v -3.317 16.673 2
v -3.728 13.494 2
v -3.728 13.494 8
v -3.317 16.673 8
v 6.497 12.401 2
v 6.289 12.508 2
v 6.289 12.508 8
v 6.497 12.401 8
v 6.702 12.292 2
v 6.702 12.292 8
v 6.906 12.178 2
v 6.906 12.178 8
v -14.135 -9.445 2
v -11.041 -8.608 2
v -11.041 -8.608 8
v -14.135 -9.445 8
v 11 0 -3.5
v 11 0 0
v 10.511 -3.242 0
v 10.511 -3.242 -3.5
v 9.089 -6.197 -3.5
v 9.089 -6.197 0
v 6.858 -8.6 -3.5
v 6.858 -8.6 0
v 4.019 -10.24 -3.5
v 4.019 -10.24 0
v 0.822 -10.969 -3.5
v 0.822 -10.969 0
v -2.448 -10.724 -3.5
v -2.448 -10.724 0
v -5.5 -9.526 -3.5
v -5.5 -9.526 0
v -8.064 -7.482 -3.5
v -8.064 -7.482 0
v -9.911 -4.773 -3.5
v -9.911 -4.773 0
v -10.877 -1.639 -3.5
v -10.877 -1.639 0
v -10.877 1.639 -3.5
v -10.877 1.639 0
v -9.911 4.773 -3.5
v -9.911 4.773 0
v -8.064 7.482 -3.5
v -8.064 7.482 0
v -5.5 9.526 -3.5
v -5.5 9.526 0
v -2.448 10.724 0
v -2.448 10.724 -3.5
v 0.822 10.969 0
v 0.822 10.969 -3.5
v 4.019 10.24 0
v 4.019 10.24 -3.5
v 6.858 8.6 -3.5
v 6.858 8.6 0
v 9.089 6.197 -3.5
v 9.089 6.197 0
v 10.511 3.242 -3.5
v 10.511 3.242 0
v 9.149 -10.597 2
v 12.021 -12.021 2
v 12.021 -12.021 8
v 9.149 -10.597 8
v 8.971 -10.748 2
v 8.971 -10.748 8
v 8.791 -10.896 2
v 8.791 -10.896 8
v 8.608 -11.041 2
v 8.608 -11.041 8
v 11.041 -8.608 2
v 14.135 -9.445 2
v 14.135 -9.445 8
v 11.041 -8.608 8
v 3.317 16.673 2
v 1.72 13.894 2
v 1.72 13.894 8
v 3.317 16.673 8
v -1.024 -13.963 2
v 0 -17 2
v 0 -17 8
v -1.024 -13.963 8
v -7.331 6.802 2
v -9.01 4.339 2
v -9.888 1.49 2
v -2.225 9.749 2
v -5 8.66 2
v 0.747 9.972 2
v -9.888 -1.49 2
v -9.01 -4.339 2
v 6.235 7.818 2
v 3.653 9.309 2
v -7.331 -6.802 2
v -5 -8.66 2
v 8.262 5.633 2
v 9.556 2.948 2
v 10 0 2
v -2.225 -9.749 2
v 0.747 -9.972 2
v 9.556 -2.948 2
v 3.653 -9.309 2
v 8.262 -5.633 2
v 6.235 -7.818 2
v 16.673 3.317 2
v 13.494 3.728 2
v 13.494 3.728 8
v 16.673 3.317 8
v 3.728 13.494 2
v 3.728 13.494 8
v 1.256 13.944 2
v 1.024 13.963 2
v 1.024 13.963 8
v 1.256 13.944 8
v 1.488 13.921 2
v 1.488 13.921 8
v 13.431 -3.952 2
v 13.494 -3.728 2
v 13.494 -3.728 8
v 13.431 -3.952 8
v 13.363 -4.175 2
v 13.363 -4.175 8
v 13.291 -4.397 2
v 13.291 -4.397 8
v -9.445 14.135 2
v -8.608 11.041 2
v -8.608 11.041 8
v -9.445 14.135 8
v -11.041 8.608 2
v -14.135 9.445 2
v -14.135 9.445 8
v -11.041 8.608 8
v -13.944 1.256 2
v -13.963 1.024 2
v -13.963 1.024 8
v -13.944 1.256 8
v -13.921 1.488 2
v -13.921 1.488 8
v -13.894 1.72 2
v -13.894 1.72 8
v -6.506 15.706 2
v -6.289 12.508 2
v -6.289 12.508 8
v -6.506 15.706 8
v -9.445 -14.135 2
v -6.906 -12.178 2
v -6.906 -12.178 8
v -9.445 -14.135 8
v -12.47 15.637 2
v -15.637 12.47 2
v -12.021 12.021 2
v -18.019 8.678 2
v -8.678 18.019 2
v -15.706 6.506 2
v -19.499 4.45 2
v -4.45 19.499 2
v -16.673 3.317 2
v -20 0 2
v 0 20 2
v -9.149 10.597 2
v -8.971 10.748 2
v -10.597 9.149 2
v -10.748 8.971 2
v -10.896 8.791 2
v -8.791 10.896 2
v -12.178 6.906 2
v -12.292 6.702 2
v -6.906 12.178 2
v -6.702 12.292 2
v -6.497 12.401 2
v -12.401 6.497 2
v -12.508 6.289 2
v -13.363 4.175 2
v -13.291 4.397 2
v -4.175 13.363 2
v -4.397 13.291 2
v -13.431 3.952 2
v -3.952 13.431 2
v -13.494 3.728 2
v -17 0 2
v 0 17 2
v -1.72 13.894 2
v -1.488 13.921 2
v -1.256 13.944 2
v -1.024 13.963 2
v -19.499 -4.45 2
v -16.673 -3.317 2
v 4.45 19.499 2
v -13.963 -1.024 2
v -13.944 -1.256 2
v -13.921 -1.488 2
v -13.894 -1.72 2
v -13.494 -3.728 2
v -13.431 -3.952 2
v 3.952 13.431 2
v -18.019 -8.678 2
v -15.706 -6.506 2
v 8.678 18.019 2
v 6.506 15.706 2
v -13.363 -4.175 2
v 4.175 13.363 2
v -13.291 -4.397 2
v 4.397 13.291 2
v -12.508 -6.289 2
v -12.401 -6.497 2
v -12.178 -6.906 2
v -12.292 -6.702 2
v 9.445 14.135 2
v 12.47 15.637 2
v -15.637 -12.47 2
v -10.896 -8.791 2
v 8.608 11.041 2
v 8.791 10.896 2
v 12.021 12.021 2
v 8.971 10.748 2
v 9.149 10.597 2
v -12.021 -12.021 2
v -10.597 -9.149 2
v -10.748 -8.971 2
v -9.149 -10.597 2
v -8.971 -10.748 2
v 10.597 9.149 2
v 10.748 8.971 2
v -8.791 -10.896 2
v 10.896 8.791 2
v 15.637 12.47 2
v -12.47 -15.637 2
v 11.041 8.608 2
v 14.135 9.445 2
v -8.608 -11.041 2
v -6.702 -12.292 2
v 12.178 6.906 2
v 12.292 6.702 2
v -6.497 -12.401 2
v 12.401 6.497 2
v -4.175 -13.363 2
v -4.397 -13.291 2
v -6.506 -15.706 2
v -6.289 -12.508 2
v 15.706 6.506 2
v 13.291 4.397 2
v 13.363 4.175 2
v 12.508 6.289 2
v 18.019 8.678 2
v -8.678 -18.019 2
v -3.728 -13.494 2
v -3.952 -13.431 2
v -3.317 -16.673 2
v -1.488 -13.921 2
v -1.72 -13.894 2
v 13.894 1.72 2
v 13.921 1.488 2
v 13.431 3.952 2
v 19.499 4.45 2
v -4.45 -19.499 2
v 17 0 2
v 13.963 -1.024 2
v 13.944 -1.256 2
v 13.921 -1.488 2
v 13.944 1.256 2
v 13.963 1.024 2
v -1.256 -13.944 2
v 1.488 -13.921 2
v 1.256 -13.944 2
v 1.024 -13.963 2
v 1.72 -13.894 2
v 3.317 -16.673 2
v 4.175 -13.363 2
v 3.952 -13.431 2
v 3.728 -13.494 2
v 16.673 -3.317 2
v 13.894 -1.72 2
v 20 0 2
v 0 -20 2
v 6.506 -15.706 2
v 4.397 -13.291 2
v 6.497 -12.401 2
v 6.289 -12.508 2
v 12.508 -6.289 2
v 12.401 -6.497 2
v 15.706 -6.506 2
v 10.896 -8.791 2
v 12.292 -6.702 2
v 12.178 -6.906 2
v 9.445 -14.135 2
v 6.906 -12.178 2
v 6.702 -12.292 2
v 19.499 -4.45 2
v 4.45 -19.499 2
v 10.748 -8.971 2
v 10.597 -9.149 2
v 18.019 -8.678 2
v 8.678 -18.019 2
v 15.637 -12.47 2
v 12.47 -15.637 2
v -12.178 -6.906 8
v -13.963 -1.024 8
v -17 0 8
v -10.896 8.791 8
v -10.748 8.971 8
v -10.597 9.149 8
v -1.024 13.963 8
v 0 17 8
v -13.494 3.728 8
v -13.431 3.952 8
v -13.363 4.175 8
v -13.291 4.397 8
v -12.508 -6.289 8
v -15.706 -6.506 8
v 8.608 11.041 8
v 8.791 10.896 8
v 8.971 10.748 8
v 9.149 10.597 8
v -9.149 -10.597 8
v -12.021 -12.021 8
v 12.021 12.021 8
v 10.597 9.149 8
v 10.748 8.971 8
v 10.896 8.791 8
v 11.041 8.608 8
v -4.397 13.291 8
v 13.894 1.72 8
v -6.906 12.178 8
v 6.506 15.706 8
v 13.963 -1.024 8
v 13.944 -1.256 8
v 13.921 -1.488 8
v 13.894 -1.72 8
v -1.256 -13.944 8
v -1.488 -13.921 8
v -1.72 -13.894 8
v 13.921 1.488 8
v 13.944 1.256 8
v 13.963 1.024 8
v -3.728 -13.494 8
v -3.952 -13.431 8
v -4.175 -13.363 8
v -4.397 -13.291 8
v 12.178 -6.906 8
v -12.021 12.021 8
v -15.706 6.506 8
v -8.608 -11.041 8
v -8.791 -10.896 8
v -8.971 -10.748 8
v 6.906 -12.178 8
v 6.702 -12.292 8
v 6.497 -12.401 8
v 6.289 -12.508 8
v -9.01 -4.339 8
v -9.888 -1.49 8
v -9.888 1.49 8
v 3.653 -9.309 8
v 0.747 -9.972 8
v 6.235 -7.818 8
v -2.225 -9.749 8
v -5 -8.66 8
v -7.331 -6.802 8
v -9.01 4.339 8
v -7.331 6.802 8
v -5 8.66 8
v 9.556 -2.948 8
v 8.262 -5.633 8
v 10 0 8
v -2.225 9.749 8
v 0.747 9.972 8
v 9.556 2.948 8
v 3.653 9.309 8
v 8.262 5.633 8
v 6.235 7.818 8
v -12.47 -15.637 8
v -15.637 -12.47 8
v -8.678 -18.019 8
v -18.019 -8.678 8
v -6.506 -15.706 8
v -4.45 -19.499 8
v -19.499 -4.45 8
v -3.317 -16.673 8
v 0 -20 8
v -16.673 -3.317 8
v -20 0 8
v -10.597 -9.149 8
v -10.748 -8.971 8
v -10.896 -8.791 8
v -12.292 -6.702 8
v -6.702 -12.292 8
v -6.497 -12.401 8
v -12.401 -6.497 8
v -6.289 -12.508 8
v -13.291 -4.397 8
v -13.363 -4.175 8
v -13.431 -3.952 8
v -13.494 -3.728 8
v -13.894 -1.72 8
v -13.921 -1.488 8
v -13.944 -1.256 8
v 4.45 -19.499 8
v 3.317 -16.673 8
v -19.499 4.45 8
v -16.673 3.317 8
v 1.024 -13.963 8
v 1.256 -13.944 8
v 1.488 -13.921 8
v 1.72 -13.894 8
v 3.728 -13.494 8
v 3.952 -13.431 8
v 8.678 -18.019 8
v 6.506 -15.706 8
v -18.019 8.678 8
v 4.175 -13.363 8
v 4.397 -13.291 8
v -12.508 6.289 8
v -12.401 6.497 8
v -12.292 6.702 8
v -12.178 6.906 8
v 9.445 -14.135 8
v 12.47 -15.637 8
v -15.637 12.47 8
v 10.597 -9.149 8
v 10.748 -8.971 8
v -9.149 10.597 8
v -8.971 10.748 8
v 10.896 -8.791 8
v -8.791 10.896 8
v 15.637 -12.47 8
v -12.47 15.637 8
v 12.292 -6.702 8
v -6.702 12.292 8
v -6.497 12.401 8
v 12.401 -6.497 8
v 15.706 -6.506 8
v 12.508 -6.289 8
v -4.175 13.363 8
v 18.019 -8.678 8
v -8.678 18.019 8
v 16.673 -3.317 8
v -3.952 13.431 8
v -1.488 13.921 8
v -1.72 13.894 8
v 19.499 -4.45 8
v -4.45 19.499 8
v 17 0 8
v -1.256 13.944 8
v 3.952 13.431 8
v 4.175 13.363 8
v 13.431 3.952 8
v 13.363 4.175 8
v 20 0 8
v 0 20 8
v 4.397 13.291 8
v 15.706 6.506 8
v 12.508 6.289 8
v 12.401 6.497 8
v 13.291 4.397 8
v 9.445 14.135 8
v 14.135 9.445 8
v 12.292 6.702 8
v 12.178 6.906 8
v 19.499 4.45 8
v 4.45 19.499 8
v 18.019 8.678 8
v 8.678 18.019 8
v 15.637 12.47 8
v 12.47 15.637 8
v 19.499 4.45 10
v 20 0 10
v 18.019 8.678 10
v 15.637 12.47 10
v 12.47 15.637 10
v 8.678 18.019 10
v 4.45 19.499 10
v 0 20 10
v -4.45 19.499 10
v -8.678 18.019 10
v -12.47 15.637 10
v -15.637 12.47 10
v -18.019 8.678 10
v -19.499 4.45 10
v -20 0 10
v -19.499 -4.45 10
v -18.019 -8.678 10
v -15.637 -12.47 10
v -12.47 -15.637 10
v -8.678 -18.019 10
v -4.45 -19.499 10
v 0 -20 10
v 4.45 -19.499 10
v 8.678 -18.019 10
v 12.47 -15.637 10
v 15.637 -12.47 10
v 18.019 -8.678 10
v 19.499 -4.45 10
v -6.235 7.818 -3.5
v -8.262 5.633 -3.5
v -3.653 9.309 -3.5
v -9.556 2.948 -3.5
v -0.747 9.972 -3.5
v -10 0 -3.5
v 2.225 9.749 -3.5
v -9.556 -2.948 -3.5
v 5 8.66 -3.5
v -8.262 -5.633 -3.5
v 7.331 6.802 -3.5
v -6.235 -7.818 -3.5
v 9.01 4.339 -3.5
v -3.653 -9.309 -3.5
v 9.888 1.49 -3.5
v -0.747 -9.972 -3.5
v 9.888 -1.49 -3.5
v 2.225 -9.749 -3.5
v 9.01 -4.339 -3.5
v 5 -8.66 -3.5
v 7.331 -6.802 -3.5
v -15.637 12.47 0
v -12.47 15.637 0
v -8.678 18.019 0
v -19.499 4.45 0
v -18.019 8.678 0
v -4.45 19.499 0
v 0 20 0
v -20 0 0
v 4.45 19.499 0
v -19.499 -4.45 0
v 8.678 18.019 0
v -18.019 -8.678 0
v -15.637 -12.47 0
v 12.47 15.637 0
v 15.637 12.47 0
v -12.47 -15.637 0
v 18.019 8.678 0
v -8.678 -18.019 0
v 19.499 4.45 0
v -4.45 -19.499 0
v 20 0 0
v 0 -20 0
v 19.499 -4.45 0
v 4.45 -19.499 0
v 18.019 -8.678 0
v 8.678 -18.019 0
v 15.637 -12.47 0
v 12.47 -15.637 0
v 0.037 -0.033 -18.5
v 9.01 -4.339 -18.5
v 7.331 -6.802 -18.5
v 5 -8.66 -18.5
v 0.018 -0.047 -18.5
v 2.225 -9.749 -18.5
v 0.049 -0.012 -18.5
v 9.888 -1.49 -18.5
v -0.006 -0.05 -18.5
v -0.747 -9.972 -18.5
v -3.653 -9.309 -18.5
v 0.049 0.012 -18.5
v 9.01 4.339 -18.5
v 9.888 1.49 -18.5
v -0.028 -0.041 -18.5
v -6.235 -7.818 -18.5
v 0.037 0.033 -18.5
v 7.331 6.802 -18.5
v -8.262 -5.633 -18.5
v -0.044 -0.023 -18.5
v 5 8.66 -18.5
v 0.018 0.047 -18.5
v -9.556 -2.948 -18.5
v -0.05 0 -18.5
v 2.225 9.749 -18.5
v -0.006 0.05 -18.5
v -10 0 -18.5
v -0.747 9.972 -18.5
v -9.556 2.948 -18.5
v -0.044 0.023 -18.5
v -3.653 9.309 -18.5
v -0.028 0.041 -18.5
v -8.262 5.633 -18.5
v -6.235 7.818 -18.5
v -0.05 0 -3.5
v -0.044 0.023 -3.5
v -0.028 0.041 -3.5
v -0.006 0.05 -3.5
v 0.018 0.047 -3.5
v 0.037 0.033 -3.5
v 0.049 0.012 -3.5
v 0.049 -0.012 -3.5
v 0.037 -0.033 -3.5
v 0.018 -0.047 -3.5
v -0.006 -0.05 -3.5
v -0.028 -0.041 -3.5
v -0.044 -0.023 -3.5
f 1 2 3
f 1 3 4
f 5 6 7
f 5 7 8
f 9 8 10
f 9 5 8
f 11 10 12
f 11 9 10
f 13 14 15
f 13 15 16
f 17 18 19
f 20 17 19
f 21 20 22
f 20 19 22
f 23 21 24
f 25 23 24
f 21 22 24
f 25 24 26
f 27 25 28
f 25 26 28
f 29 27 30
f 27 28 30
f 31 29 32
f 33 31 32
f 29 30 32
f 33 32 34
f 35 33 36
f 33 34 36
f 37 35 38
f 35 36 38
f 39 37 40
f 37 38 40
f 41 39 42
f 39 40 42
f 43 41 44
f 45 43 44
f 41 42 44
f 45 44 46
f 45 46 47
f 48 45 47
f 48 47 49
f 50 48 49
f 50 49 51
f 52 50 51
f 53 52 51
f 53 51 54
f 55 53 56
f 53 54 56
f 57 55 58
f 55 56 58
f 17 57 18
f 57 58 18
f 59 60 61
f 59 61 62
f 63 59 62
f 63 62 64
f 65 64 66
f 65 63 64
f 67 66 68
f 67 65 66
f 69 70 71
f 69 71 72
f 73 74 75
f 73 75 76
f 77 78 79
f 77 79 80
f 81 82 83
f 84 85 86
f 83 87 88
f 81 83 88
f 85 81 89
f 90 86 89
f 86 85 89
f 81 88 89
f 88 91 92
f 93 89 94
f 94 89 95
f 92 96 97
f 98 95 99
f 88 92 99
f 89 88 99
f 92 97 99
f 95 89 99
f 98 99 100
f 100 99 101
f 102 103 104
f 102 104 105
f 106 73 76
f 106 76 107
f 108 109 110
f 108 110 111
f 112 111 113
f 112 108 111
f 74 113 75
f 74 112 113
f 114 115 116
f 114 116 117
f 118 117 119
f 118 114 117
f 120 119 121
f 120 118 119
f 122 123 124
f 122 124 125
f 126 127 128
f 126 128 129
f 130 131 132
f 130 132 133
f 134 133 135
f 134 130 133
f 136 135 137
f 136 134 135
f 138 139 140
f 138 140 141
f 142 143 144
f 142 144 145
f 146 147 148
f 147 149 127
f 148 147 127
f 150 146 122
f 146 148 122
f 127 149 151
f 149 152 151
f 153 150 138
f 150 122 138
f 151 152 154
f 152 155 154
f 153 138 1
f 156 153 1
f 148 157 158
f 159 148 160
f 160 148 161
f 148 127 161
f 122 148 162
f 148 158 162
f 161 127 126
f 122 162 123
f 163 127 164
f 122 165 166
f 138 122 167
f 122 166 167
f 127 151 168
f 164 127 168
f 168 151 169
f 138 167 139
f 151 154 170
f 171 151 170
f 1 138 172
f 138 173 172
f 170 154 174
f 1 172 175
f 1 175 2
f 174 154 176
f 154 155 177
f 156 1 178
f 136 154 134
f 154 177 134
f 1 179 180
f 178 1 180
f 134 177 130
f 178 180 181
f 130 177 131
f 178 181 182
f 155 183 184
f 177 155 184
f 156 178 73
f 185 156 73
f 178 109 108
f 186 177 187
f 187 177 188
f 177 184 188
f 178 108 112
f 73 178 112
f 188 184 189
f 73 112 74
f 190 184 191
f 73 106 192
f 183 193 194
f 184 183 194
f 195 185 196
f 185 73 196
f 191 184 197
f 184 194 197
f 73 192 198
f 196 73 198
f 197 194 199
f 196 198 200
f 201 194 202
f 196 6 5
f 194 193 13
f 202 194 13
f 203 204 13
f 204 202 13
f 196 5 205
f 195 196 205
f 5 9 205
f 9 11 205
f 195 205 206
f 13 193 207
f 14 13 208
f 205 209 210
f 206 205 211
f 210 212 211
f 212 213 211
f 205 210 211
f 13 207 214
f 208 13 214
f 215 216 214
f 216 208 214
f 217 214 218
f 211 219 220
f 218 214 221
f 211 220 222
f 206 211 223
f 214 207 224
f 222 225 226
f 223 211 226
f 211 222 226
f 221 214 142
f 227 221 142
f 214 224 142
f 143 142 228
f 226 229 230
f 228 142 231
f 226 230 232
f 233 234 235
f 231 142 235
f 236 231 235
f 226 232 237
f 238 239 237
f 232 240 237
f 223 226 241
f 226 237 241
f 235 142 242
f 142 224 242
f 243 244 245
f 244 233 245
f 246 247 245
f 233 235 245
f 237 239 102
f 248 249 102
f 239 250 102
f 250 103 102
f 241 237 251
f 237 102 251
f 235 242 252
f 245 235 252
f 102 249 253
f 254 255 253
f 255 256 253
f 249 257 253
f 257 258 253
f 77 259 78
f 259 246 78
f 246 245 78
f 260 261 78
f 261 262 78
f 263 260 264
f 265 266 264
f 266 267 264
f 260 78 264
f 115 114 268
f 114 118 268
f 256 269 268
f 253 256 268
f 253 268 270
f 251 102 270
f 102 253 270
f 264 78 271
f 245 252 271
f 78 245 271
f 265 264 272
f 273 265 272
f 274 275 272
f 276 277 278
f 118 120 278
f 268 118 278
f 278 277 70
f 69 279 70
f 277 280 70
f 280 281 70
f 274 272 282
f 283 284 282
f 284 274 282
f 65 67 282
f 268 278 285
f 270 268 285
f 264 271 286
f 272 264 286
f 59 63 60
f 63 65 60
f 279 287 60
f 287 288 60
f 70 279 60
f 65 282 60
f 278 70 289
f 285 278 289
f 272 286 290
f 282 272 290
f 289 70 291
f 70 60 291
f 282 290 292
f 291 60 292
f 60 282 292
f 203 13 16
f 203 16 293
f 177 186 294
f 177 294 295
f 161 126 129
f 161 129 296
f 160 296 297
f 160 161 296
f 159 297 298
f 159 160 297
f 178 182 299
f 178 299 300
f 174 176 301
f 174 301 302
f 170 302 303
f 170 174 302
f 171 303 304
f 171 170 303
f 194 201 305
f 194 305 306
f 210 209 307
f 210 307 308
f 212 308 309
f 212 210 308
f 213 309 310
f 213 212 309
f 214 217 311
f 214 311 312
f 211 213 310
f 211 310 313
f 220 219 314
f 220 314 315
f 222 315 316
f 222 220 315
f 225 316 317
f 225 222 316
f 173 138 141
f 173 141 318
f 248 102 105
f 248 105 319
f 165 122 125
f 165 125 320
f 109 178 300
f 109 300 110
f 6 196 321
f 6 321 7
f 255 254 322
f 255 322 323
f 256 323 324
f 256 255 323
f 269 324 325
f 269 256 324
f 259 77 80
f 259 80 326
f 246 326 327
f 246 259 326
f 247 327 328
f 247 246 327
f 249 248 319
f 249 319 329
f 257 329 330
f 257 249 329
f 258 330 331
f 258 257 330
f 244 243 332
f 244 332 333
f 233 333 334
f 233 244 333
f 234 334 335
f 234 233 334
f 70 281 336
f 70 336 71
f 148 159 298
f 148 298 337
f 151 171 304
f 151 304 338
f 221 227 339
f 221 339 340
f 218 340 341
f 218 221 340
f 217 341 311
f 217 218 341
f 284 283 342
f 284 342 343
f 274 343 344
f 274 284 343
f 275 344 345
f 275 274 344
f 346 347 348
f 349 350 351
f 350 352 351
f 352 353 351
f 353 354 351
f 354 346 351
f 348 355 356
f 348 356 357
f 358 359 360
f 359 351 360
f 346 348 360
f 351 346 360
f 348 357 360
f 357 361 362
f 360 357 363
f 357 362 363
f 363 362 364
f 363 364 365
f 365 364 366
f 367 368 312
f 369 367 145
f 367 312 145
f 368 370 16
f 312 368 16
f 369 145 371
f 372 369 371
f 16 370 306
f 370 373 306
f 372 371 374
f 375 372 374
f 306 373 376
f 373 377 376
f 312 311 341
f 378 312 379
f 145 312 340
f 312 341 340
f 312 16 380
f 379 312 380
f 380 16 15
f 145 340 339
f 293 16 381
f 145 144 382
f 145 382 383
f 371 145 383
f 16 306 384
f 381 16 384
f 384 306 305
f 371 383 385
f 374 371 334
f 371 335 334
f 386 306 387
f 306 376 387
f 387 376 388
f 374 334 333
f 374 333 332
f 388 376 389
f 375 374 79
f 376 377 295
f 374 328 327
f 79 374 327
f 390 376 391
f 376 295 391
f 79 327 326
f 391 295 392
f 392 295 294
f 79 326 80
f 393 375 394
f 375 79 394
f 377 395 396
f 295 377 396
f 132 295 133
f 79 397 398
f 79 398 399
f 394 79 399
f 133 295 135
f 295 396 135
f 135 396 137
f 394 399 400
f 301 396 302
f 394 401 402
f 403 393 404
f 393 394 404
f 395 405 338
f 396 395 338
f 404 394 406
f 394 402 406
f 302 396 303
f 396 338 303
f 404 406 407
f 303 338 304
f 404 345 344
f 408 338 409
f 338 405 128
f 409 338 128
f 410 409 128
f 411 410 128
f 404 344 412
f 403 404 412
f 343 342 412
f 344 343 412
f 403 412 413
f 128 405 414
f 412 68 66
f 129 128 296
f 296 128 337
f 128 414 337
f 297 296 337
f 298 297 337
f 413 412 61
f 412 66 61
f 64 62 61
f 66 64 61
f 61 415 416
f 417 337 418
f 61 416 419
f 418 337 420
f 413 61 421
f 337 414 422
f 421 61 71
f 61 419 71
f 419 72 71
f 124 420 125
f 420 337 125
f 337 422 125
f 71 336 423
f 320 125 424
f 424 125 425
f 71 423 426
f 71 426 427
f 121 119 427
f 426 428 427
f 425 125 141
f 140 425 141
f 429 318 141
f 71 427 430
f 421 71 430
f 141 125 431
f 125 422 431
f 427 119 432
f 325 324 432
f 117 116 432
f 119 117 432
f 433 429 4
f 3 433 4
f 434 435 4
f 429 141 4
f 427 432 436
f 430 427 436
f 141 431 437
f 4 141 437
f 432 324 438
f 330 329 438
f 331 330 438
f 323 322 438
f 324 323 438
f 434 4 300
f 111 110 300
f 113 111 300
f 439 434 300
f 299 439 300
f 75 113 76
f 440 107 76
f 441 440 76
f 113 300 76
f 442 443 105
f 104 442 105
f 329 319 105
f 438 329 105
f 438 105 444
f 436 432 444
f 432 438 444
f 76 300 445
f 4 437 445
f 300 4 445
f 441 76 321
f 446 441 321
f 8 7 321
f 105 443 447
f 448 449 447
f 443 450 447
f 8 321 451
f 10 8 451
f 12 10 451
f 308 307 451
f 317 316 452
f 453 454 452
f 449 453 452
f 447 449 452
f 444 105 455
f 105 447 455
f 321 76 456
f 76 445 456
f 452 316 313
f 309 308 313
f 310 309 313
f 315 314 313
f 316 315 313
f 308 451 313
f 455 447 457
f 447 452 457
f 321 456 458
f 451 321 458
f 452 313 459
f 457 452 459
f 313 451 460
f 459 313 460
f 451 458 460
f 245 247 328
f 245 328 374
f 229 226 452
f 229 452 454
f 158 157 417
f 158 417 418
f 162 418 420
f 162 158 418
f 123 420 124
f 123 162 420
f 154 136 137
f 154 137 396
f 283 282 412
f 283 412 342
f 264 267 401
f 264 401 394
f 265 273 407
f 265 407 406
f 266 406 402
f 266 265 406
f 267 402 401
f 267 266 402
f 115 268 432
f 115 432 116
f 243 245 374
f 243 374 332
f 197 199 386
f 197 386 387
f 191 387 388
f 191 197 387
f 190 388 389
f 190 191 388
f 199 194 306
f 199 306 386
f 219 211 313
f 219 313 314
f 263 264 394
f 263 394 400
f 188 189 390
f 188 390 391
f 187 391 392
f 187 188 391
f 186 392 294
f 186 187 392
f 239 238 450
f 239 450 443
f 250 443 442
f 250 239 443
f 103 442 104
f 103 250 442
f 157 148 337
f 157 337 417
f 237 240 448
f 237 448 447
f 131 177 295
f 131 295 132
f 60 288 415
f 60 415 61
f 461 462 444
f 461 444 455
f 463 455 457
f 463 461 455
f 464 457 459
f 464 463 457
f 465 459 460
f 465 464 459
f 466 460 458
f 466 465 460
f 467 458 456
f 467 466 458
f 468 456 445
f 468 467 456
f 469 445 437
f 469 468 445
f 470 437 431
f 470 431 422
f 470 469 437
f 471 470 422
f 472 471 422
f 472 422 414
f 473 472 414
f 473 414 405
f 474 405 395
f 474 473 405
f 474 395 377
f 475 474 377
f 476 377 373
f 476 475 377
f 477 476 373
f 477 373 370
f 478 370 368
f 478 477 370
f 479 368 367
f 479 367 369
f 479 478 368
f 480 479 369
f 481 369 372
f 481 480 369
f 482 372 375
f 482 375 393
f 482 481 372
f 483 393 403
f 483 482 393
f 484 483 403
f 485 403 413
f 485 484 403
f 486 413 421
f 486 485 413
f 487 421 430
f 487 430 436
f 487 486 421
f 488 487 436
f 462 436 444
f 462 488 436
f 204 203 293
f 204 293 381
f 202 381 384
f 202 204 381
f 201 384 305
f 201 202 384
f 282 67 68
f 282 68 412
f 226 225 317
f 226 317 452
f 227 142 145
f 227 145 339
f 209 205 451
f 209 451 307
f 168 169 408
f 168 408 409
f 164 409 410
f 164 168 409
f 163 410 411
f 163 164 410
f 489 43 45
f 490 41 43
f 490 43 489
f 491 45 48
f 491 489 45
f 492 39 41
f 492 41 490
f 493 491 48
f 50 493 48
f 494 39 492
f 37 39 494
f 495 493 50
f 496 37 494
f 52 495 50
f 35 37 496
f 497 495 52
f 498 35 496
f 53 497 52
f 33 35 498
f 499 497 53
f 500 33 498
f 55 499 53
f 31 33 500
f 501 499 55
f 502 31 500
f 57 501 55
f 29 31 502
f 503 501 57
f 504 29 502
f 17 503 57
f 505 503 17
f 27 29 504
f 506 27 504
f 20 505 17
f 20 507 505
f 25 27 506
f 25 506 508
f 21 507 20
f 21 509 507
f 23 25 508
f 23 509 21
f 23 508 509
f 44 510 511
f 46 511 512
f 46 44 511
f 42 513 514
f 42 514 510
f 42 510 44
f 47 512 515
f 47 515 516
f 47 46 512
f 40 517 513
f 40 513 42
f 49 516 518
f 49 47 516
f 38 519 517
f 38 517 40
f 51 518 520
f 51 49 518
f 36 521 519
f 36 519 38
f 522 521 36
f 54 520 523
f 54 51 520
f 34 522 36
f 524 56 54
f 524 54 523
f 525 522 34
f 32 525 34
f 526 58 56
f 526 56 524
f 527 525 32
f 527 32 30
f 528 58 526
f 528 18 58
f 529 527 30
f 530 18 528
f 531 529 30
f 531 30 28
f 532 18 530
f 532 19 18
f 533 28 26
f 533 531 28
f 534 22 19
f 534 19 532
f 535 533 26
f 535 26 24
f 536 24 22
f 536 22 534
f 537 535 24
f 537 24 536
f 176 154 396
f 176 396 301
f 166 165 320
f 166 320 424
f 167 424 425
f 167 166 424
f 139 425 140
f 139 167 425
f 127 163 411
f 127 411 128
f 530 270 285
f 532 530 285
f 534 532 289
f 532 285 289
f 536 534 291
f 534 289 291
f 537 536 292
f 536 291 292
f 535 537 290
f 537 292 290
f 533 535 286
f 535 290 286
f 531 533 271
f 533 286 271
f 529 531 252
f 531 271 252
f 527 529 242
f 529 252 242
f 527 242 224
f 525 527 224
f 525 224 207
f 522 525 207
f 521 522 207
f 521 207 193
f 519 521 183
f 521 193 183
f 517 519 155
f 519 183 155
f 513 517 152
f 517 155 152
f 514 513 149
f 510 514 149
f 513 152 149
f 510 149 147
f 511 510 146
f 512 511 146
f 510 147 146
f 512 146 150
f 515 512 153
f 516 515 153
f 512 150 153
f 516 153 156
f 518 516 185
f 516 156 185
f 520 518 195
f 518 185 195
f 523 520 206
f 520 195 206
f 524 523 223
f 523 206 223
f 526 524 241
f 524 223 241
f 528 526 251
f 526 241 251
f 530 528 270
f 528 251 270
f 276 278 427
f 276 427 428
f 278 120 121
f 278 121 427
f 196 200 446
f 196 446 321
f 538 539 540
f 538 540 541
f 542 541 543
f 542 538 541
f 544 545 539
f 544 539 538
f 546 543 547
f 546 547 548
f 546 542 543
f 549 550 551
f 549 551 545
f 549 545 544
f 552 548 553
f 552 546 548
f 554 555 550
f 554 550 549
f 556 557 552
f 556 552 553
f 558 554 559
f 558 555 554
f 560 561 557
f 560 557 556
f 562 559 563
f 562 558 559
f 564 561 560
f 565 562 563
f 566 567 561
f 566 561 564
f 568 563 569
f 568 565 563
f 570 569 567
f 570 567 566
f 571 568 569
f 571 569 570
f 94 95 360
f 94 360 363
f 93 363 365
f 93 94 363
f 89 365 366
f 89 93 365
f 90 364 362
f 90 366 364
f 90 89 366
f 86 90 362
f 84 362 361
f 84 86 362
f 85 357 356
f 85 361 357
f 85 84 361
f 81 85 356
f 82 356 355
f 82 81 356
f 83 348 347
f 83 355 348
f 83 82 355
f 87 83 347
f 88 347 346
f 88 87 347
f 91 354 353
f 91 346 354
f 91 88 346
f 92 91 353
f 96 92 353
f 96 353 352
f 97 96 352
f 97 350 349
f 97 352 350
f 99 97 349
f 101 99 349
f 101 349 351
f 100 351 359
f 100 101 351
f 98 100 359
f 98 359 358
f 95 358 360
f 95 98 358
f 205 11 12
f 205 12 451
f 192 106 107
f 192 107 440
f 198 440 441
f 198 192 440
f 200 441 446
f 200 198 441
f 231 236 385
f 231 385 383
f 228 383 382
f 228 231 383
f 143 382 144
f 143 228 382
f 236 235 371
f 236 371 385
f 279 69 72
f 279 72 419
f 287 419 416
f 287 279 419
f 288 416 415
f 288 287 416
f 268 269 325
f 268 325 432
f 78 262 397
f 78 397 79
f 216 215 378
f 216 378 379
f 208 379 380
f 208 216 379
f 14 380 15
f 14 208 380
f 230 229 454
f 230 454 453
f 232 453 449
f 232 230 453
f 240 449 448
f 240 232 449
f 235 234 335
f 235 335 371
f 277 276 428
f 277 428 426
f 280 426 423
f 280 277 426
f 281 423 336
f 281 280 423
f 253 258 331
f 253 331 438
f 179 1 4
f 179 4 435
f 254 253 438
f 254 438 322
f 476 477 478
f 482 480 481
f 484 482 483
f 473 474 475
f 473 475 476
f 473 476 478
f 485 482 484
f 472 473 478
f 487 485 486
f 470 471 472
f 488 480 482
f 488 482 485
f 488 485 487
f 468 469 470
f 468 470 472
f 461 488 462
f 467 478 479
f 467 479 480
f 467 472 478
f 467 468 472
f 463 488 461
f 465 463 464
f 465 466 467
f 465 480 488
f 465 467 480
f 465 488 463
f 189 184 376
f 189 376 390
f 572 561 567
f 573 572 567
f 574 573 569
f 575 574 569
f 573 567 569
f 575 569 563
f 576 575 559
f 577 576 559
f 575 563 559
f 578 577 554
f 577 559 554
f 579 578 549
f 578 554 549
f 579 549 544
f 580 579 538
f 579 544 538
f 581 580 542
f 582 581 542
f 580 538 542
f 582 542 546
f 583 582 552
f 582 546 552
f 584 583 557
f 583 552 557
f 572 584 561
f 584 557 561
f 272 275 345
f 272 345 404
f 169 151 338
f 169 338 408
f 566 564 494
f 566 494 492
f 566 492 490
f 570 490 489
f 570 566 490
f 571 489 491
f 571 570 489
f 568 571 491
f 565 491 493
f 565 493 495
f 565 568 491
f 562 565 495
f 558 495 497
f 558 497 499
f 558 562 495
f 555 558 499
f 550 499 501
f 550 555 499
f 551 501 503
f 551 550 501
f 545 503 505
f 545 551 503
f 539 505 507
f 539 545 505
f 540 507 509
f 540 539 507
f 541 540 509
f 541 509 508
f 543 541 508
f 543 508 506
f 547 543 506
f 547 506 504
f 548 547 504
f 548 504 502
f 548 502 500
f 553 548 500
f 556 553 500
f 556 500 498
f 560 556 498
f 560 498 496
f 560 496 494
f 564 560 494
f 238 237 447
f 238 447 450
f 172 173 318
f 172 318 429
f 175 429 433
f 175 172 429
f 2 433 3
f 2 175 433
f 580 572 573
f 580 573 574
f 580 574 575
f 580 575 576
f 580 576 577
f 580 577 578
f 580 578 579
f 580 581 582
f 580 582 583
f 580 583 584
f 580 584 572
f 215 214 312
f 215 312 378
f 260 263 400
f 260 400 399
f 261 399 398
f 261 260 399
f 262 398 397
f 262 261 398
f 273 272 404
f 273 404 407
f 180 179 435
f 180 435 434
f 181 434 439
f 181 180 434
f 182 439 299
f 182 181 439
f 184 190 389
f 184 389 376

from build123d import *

# Parameters (mm, degrees)
SKETCH1_R           = 10
BOSS_EXTRUDE1_DEPTH = 10
SKETCH2_R           = 20
BOSS_EXTRUDE2_DEPTH = 2
BOSS_EXTRUDE3_START = -2
SKETCH3_R           = 20
BOSS_EXTRUDE3_DEPTH = 2
BOSS_EXTRUDE4_START = 18.5
SKETCH4_R           = 10
SKETCH4_R_2         = 0.05
BOSS_EXTRUDE4_DEPTH = 18.5
SKETCH5_R           = 11
BOSS_EXTRUDE5_DEPTH = 3.5


with BuildPart() as part:
    # Sketch1 → Boss-Extrude1 (new body)
    with BuildSketch(Plane.XY):
        with BuildLine():
            Line((0, 17), (1.023829773, 13.962513119))
            ThreePointArc((1.023829773, 13.962513119), (1.372239965, 13.932586173), (1.719794009, 13.893966625))
            Line((1.719794009, 13.893966625), (3.316535474, 16.673349767))
            Line((3.316535474, 16.673349767), (3.728108352, 13.494488064))
            ThreePointArc((3.728108352, 13.494488064), (4.063985482, 13.3971647), (4.397327072, 13.291482785))
            Line((4.397327072, 13.291482785), (6.50561835, 15.705952053))
            Line((6.50561835, 15.705952053), (6.289117817, 12.507877401))
            ThreePointArc((6.289117817, 12.507877401), (6.599554316, 12.346897701), (6.905873322, 12.178214715))
            Line((6.905873322, 12.178214715), (9.444693961, 14.134983409))
            Line((9.444693961, 14.134983409), (8.608440012, 11.040596024))
            ThreePointArc((8.608440012, 11.040596024), (8.881505978, 10.822146347), (9.149030733, 10.596944684))
            Line((9.149030733, 10.596944684), (12.02081528, 12.02081528))
            Line((12.02081528, 12.02081528), (10.596944684, 9.149030733))
            ThreePointArc((10.596944684, 9.149030733), (10.822146347, 8.881505978), (11.040596024, 8.608440012))
            Line((11.040596024, 8.608440012), (14.134983409, 9.444693961))
            Line((14.134983409, 9.444693961), (12.178214715, 6.905873322))
            ThreePointArc((12.178214715, 6.905873322), (12.346897701, 6.599554316), (12.507877401, 6.289117817))
            Line((12.507877401, 6.289117817), (15.705952053, 6.50561835))
            Line((15.705952053, 6.50561835), (13.291482785, 4.397327072))
            ThreePointArc((13.291482785, 4.397327072), (13.3971647, 4.063985482), (13.494488064, 3.728108352))
            Line((13.494488064, 3.728108352), (16.673349767, 3.316535474))
            Line((16.673349767, 3.316535474), (13.893966625, 1.719794009))
            ThreePointArc((13.893966625, 1.719794009), (13.932586173, 1.372239965), (13.962513119, 1.023829773))
            Line((13.962513119, 1.023829773), (17, 0))
            Line((17, 0), (13.962513119, -1.023829773))
            ThreePointArc((13.962513119, -1.023829773), (13.932586173, -1.372239965), (13.893966625, -1.719794009))
            Line((13.893966625, -1.719794009), (16.673349767, -3.316535474))
            Line((16.673349767, -3.316535474), (13.494488064, -3.728108352))
            ThreePointArc((13.494488064, -3.728108352), (13.3971647, -4.063985482), (13.291482785, -4.397327072))
            Line((13.291482785, -4.397327072), (15.705952053, -6.50561835))
            Line((15.705952053, -6.50561835), (12.507877401, -6.289117817))
            ThreePointArc((12.507877401, -6.289117817), (12.346897701, -6.599554316), (12.178214715, -6.905873322))
            Line((12.178214715, -6.905873322), (14.134983409, -9.444693961))
            Line((14.134983409, -9.444693961), (11.040596024, -8.608440012))
            ThreePointArc((11.040596024, -8.608440012), (10.822146347, -8.881505978), (10.596944684, -9.149030733))
            Line((10.596944684, -9.149030733), (12.02081528, -12.02081528))
            Line((12.02081528, -12.02081528), (9.149030733, -10.596944684))
            ThreePointArc((9.149030733, -10.596944684), (8.881505978, -10.822146347), (8.608440012, -11.040596024))
            Line((8.608440012, -11.040596024), (9.444693961, -14.134983409))
            Line((9.444693961, -14.134983409), (6.905873322, -12.178214715))
            ThreePointArc((6.905873322, -12.178214715), (6.599554316, -12.346897701), (6.289117817, -12.507877401))
            Line((6.289117817, -12.507877401), (6.50561835, -15.705952053))
            Line((6.50561835, -15.705952053), (4.397327072, -13.291482785))
            ThreePointArc((4.397327072, -13.291482785), (4.063985482, -13.3971647), (3.728108352, -13.494488064))
            Line((3.728108352, -13.494488064), (3.316535474, -16.673349767))
            Line((3.316535474, -16.673349767), (1.719794009, -13.893966625))
            ThreePointArc((1.719794009, -13.893966625), (1.372239965, -13.932586173), (1.023829773, -13.962513119))
            Line((1.023829773, -13.962513119), (0, -17))
            Line((0, -17), (-1.023829773, -13.962513119))
            ThreePointArc((-1.023829773, -13.962513119), (-1.372239965, -13.932586173), (-1.719794009, -13.893966625))
            Line((-1.719794009, -13.893966625), (-3.316535474, -16.673349767))
            Line((-3.316535474, -16.673349767), (-3.728108352, -13.494488064))
            ThreePointArc((-3.728108352, -13.494488064), (-4.063985482, -13.3971647), (-4.397327072, -13.291482785))
            Line((-4.397327072, -13.291482785), (-6.50561835, -15.705952053))
            Line((-6.50561835, -15.705952053), (-6.289117817, -12.507877401))
            ThreePointArc((-6.289117817, -12.507877401), (-6.599554316, -12.346897701), (-6.905873322, -12.178214715))
            Line((-6.905873322, -12.178214715), (-9.444693961, -14.134983409))
            Line((-9.444693961, -14.134983409), (-8.608440012, -11.040596024))
            ThreePointArc((-8.608440012, -11.040596024), (-8.881505978, -10.822146347), (-9.149030733, -10.596944684))
            Line((-9.149030733, -10.596944684), (-12.02081528, -12.02081528))
            Line((-12.02081528, -12.02081528), (-10.596944684, -9.149030733))
            ThreePointArc((-10.596944684, -9.149030733), (-10.822146347, -8.881505978), (-11.040596024, -8.608440012))
            Line((-11.040596024, -8.608440012), (-14.134983409, -9.444693961))
            Line((-14.134983409, -9.444693961), (-12.178214715, -6.905873322))
            ThreePointArc((-12.178214715, -6.905873322), (-12.346897701, -6.599554316), (-12.507877401, -6.289117817))
            Line((-12.507877401, -6.289117817), (-15.705952053, -6.50561835))
            Line((-15.705952053, -6.50561835), (-13.291482785, -4.397327072))
            ThreePointArc((-13.291482785, -4.397327072), (-13.3971647, -4.063985482), (-13.494488064, -3.728108352))
            Line((-13.494488064, -3.728108352), (-16.673349767, -3.316535474))
            Line((-16.673349767, -3.316535474), (-13.893966625, -1.719794009))
            ThreePointArc((-13.893966625, -1.719794009), (-13.932586173, -1.372239965), (-13.962513119, -1.023829773))
            Line((-13.962513119, -1.023829773), (-17, 0))
            Line((-17, 0), (-13.962513119, 1.023829773))
            ThreePointArc((-13.962513119, 1.023829773), (-13.932586173, 1.372239965), (-13.893966625, 1.719794009))
            Line((-13.893966625, 1.719794009), (-16.673349767, 3.316535474))
            Line((-16.673349767, 3.316535474), (-13.494488064, 3.728108352))
            ThreePointArc((-13.494488064, 3.728108352), (-13.3971647, 4.063985482), (-13.291482785, 4.397327072))
            Line((-13.291482785, 4.397327072), (-15.705952053, 6.50561835))
            Line((-15.705952053, 6.50561835), (-12.507877401, 6.289117817))
            ThreePointArc((-12.507877401, 6.289117817), (-12.346897701, 6.599554316), (-12.178214715, 6.905873322))
            Line((-12.178214715, 6.905873322), (-14.134983409, 9.444693961))
            Line((-14.134983409, 9.444693961), (-11.040596024, 8.608440012))
            ThreePointArc((-11.040596024, 8.608440012), (-10.822146347, 8.881505978), (-10.596944684, 9.149030733))
            Line((-10.596944684, 9.149030733), (-12.02081528, 12.02081528))
            Line((-12.02081528, 12.02081528), (-9.149030733, 10.596944684))
            ThreePointArc((-9.149030733, 10.596944684), (-8.881505978, 10.822146347), (-8.608440012, 11.040596024))
            Line((-8.608440012, 11.040596024), (-9.444693961, 14.134983409))
            Line((-9.444693961, 14.134983409), (-6.905873322, 12.178214715))
            ThreePointArc((-6.905873322, 12.178214715), (-6.599554316, 12.346897701), (-6.289117817, 12.507877401))
            Line((-6.289117817, 12.507877401), (-6.50561835, 15.705952053))
            Line((-6.50561835, 15.705952053), (-4.397327072, 13.291482785))
            ThreePointArc((-4.397327072, 13.291482785), (-4.063985482, 13.3971647), (-3.728108352, 13.494488064))
            Line((-3.728108352, 13.494488064), (-3.316535474, 16.673349767))
            Line((-3.316535474, 16.673349767), (-1.719794009, 13.893966625))
            ThreePointArc((-1.719794009, 13.893966625), (-1.372239965, 13.932586173), (-1.023829773, 13.962513119))
            Line((-1.023829773, 13.962513119), (0, 17))
        make_face()
        Circle(SKETCH1_R, mode=Mode.SUBTRACT)
    extrude(amount=BOSS_EXTRUDE1_DEPTH)

    # Sketch2 → Boss-Extrude2 (add)
    with BuildSketch(Plane.XY.offset(10)):
        Circle(SKETCH2_R)
    extrude(amount=-BOSS_EXTRUDE2_DEPTH)

    # Sketch3 → Boss-Extrude3 (add)
    with BuildSketch(Plane(origin=(0, 0, 0), x_dir=(-1, 0, 0), z_dir=(0, 0, -1)).offset(BOSS_EXTRUDE3_START)):
        with Locations(Location((0, 0, 0), (0, 0, 180))):
            Circle(SKETCH3_R)
    extrude(amount=BOSS_EXTRUDE3_DEPTH)

    # Sketch4 → Boss-Extrude4 (add)
    with BuildSketch(Plane(origin=(0, 0, 0), x_dir=(-1, 0, 0), z_dir=(0, 0, -1)).offset(BOSS_EXTRUDE4_START)):
        Circle(SKETCH4_R)
        Circle(SKETCH4_R_2, mode=Mode.SUBTRACT)
    extrude(amount=-BOSS_EXTRUDE4_DEPTH)

    # Sketch5 → Boss-Extrude5 (add)
    with BuildSketch(Plane(origin=(0, 0, 0), x_dir=(-1, 0, 0), z_dir=(0, 0, -1))):
        with Locations(Location((0, 0, 0), (0, 0, 180))):
            Circle(SKETCH5_R)
    extrude(amount=BOSS_EXTRUDE5_DEPTH)


solid = part.part
